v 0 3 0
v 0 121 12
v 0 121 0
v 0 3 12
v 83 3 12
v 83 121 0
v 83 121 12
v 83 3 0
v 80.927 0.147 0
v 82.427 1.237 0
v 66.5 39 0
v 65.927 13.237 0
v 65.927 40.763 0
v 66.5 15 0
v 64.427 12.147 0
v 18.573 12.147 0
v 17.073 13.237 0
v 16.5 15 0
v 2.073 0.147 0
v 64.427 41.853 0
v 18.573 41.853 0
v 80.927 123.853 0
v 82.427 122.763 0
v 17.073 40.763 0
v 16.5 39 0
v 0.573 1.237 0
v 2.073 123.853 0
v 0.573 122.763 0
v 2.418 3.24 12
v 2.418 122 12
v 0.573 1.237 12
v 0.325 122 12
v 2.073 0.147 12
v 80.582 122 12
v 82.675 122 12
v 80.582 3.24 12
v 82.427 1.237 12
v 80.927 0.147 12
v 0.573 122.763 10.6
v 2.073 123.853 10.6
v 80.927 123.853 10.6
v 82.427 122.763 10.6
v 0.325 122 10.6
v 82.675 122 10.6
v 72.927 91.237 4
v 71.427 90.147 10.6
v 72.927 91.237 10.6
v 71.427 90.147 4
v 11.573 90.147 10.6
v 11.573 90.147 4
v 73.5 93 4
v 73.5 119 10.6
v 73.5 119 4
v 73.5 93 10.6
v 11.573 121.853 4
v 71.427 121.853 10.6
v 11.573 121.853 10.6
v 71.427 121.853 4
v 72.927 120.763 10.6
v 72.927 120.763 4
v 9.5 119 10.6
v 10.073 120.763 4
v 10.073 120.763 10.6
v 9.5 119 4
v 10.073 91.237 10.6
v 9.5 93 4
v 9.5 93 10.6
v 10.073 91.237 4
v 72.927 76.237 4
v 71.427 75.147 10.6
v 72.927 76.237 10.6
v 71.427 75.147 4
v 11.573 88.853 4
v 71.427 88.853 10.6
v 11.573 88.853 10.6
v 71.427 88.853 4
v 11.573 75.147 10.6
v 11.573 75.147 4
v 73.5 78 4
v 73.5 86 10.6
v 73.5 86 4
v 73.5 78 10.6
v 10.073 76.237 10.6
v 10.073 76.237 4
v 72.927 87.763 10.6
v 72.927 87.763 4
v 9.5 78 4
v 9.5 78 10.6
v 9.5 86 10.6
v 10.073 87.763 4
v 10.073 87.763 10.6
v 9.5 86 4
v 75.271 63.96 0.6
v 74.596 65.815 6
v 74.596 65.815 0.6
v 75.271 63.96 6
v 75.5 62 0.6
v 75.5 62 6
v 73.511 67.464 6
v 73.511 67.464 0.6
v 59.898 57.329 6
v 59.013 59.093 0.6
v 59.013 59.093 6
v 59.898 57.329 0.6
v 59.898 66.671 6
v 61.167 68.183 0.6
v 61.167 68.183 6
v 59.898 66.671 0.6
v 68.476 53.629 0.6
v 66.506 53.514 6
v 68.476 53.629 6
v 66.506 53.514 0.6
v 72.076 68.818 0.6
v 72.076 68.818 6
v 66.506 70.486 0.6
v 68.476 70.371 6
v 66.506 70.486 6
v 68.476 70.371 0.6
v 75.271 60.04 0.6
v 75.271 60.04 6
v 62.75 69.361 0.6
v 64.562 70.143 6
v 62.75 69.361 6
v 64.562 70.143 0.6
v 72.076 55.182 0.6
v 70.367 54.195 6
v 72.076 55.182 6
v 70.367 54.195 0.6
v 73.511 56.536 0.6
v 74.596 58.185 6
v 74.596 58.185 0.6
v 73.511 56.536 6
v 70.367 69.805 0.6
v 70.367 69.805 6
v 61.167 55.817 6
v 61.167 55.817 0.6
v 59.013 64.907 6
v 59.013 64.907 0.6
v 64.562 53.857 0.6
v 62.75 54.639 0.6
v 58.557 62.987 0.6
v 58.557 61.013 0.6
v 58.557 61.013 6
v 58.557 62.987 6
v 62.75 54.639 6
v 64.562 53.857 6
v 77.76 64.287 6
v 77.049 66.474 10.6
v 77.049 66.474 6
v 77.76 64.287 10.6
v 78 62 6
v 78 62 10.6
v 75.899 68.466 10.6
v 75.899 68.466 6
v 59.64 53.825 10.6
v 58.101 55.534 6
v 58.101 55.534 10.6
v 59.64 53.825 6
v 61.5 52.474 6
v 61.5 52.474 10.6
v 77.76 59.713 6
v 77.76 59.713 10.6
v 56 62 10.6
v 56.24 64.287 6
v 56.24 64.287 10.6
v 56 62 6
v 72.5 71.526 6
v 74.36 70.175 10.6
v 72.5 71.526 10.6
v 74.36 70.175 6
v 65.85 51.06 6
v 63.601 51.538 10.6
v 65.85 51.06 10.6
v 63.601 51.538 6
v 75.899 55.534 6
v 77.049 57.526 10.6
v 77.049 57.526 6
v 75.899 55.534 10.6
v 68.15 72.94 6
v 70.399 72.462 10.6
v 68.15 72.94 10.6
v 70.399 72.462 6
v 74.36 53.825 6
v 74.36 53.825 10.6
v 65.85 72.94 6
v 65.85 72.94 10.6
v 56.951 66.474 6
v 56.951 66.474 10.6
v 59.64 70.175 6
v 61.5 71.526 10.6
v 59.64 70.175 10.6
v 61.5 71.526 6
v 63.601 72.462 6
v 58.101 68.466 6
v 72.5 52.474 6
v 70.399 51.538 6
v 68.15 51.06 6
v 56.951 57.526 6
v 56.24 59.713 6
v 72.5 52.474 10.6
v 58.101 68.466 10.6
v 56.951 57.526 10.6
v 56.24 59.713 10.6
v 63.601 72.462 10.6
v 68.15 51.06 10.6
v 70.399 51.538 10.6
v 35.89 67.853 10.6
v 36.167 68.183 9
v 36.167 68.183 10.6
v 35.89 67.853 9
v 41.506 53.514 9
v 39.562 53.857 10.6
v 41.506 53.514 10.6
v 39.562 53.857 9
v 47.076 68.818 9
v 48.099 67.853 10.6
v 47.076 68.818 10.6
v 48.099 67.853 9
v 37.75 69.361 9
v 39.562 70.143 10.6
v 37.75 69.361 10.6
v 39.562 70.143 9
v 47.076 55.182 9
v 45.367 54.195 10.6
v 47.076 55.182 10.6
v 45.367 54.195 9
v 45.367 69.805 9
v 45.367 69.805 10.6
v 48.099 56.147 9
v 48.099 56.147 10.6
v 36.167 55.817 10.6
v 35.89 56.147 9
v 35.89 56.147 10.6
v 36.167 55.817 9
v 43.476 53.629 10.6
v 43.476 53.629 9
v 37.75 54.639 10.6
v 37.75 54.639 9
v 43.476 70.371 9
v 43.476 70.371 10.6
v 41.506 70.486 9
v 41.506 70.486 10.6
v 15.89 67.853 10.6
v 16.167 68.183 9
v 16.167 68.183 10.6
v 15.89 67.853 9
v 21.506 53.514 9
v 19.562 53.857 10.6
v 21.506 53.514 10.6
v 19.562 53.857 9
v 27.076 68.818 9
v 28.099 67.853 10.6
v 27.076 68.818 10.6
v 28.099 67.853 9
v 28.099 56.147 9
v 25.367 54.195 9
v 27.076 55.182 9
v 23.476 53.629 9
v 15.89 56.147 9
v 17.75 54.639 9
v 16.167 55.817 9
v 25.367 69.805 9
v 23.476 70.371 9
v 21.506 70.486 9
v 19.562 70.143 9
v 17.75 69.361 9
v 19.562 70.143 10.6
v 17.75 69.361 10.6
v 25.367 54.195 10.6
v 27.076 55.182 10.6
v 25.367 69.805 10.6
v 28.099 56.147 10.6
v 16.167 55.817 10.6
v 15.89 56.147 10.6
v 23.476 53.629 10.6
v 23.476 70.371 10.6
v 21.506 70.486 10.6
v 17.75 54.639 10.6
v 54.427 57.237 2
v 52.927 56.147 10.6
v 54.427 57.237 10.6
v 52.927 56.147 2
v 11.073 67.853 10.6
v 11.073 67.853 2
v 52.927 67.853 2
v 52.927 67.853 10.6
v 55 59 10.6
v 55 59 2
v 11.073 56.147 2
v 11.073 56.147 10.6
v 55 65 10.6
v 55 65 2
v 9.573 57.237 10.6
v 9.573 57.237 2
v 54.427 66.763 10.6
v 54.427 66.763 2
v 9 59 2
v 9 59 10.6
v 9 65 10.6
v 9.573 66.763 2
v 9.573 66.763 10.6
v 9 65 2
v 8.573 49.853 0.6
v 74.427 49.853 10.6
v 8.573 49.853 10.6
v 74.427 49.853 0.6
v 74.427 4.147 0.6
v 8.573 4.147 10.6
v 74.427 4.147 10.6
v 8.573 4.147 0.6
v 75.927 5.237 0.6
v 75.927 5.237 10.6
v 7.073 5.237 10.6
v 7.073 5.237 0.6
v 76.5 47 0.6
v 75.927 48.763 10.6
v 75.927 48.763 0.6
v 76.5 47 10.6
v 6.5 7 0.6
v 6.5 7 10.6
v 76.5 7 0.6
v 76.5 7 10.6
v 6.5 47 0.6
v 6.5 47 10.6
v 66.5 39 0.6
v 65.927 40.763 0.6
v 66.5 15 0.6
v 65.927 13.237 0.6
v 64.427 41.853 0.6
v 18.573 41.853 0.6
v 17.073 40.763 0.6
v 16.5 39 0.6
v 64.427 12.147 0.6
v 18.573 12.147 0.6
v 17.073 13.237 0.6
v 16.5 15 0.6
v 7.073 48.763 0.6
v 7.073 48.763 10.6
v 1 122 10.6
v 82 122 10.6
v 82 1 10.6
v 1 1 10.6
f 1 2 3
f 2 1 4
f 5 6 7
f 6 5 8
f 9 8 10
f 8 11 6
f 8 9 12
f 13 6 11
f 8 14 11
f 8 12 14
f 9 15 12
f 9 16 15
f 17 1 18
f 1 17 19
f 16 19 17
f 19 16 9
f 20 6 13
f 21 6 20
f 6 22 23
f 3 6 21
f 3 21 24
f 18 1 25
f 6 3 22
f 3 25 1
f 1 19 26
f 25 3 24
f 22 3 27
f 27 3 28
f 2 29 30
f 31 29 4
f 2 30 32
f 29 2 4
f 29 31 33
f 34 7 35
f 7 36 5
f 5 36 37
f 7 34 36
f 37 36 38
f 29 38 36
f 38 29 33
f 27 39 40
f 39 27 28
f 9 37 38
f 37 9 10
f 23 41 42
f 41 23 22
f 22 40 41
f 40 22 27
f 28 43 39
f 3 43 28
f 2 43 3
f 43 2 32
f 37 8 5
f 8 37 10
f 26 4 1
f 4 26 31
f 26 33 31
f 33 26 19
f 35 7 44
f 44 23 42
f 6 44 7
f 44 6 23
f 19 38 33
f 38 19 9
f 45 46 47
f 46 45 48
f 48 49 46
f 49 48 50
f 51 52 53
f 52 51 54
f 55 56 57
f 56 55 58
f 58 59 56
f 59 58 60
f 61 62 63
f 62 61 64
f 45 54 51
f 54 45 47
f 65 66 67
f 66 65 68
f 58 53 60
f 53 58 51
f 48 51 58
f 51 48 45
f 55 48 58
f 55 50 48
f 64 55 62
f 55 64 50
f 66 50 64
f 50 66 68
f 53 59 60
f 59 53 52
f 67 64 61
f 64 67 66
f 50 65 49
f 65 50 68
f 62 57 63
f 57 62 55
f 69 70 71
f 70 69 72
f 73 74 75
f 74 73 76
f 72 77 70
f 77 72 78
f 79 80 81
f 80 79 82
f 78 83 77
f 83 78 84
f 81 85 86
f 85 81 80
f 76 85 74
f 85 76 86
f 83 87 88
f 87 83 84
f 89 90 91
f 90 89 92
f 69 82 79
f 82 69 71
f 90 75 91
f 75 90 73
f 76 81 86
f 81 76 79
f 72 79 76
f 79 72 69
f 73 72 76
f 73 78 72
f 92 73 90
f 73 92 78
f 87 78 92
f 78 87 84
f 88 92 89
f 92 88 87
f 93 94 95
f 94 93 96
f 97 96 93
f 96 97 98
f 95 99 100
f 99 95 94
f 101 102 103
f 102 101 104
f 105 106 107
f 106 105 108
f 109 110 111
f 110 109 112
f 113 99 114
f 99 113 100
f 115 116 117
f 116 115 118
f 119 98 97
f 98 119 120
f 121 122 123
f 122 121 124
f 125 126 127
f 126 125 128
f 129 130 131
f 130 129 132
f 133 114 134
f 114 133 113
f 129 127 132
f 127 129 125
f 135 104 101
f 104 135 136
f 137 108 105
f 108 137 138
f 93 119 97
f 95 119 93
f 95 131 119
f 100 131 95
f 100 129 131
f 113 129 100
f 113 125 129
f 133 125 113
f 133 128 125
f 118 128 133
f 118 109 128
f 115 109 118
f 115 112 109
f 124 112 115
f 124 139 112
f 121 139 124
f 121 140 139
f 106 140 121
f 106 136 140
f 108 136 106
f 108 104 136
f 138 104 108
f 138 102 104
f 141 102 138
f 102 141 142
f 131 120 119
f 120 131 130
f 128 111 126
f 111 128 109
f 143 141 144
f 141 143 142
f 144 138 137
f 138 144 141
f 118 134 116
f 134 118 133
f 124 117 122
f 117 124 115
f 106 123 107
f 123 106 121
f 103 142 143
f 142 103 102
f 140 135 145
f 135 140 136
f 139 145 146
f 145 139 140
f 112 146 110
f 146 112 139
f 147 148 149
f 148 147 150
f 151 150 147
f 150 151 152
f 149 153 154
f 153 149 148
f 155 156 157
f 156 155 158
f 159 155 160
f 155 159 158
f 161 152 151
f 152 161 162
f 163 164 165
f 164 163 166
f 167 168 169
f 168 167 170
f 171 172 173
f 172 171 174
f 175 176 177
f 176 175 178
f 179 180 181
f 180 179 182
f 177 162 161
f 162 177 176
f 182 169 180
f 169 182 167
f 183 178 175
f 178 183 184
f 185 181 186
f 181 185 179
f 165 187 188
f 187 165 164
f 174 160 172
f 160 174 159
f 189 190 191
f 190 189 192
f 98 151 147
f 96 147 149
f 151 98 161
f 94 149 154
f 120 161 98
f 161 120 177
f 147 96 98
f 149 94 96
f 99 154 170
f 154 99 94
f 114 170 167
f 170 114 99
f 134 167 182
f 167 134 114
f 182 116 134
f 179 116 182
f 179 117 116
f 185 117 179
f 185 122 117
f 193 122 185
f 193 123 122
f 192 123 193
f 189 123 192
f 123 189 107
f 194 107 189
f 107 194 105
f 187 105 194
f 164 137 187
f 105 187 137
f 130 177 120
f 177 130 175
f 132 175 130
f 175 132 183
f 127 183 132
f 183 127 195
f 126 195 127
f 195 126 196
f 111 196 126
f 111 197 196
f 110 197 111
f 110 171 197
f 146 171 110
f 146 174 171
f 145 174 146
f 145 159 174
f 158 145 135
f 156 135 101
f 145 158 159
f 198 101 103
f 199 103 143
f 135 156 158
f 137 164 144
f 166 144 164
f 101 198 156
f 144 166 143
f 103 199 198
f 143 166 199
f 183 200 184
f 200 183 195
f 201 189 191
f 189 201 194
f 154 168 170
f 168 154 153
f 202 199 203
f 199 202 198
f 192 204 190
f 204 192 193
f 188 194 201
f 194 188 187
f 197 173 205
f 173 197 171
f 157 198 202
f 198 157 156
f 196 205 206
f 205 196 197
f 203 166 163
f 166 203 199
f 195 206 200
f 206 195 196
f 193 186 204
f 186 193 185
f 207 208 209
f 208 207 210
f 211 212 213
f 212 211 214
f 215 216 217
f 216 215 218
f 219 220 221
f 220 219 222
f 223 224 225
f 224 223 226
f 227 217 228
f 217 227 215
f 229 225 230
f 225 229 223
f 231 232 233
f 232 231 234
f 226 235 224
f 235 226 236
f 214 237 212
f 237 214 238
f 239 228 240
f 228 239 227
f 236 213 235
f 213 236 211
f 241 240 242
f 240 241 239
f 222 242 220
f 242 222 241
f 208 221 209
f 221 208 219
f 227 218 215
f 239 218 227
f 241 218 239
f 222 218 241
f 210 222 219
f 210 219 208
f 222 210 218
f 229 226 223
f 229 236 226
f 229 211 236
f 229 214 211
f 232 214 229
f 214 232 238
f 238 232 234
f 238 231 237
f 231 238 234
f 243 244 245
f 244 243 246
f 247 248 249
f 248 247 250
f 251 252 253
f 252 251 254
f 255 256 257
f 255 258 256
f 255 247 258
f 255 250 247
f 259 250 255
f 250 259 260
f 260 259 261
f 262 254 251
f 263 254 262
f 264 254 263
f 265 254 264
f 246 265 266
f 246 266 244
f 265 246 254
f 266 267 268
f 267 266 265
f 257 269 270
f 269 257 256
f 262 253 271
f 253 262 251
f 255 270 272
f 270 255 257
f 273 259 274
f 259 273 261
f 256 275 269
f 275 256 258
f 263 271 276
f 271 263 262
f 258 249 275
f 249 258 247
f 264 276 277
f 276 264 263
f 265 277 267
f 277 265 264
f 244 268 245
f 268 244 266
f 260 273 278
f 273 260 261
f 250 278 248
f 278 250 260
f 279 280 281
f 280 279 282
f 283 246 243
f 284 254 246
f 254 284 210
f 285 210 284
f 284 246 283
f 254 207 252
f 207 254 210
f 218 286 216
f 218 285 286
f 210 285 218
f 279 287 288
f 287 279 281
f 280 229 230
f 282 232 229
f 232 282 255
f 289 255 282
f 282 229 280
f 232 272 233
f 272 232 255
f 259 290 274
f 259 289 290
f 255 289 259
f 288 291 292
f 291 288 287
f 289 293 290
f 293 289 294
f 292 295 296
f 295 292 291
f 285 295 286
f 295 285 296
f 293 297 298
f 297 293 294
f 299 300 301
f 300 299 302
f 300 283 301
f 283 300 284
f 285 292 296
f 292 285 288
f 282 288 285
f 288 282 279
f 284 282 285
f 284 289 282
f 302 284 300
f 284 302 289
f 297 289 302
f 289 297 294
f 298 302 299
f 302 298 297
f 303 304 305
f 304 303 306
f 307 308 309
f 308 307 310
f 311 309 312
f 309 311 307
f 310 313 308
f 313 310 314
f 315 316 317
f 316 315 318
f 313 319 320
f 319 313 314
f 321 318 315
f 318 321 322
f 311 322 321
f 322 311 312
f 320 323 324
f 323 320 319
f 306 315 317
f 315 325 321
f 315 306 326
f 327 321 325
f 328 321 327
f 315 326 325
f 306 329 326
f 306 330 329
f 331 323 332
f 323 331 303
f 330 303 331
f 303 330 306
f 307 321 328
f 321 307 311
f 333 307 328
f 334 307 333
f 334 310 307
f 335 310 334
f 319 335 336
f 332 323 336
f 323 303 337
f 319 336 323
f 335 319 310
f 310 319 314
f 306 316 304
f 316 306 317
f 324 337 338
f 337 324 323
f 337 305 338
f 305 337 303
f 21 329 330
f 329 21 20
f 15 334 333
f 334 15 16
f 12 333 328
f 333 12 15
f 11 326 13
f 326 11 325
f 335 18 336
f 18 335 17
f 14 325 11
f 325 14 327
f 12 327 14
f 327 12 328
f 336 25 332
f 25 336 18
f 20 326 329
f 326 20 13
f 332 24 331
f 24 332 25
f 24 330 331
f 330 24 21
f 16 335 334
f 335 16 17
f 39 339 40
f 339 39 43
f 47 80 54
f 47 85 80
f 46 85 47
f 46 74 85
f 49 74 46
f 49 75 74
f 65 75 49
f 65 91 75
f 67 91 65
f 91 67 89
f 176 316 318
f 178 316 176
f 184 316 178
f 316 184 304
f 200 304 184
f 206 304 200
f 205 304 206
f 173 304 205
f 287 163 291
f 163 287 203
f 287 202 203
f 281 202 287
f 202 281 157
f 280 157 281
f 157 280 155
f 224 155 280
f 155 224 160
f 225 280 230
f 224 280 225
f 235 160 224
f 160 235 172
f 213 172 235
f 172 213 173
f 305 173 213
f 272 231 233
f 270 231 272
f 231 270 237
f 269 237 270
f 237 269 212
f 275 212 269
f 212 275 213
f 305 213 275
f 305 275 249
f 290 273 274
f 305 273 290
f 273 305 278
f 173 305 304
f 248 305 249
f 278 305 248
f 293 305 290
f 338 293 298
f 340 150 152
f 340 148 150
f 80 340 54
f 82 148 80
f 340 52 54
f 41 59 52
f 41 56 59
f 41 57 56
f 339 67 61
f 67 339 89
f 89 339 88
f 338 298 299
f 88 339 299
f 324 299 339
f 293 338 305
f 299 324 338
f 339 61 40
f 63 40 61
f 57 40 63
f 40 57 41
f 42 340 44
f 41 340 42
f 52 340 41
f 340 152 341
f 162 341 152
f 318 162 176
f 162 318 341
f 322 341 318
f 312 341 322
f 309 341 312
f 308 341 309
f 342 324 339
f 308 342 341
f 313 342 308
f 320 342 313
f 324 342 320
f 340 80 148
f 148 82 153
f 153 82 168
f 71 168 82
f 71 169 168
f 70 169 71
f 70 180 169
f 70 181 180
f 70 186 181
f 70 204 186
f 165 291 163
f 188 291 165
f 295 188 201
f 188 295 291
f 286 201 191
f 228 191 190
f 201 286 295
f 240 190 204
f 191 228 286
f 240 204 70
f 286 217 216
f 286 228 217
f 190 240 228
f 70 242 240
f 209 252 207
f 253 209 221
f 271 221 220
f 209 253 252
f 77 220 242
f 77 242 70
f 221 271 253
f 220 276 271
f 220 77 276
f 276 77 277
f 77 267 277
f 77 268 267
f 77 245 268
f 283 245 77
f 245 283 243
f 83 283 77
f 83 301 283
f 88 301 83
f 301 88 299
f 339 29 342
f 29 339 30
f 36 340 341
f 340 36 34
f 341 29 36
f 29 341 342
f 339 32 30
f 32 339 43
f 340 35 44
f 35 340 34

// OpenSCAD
// Millennia Tracks of Time player bits organizer

module roundedCube(vec,rad=3) {
	hull() {
		translate([rad,rad,0]) cylinder(r=rad,h=vec.z);
		translate([rad,vec.y-rad,0]) cylinder(r=rad,h=vec.z);
		translate([vec.x-rad,vec.y-rad,0]) cylinder(r=rad,h=vec.z);
		translate([vec.x-rad,rad,0]) cylinder(r=rad,h=vec.z);
	}
}

module playerBox() {
    w=83;
    h=124;
	difference() {
		roundedCube([w,124,12]);
        
		translate([(w-64)/2,90,4])
			roundedCube([64,32,99]);
		translate([(w-64)/2,75,4])
			roundedCube([64,14,99]);
            
		translate([67,62,0.6])
			cylinder(d=17,h=99);
		translate([67,62,6])
			cylinder(d=22,h=99);
            
		translate([42,62,9])
			cylinder(d=17,h=99);
		translate([22,62,9])
			cylinder(d=17,h=99);
            
        translate([9,56,2])
            roundedCube([46,12,99]);
            
        /* translate([10,41,10])
            roundedCube([82-20,18,99]); */
        
		/* translate([(w-33)/2,60,4])
			roundedCube([33,11,99]);*/
            
        translate([(w-70)/2,4,0.6])
            roundedCube([70,46,99]);
        translate([(w-50)/2,4+8,-1]) 
            roundedCube([50,46-16,99]);
            
        translate([w/2,130/2,10.6])
            linear_extrude(scale=0.95,height=2)
                square([81,128],center=true);
               
        /* translate([82/2,124,16])
            rotate([90,0,0])
                cylinder(h=10,d=20);*/
        translate([-1,h-2,10.6])
            cube([99,10,99]);
    }
}	

module playerBoxTest() {
	difference() {
		roundedCube([83,124,2]);
        translate([83/2,130/2,0.6])
            linear_extrude(scale=0.95,height=2)
                square([81,128],center=true);
        translate([-1,122,0.6])
            cube([99,10,99]);
    }
}

playerBox();
